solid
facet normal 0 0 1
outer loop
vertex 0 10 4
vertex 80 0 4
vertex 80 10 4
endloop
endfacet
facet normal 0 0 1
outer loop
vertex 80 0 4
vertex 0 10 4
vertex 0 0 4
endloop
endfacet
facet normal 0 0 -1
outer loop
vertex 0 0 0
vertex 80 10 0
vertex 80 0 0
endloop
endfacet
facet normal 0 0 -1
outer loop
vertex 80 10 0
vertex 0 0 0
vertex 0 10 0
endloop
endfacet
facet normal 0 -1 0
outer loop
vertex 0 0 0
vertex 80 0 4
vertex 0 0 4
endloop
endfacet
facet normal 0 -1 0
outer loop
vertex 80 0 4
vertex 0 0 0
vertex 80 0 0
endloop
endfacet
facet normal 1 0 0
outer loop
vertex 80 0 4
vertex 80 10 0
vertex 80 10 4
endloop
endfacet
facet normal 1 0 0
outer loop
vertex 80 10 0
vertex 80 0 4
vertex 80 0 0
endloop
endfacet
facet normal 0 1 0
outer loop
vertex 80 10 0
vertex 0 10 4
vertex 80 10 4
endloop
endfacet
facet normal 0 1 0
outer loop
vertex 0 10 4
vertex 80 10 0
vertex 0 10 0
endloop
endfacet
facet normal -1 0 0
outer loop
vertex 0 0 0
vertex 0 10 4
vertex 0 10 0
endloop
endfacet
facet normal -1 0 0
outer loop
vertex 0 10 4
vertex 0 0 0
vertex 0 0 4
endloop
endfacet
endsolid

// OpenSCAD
$fa=1;
$fs=1;



module build_it() {
   cube([80,10,4]);
}

module build_it2() {
	difference() {
		union() {
	      translate([5,0,0]) {
				cube([100, 10, 4]);
			   translate([50,5,-1]) {
				   cylinder(r=30, h=6);
				}
	      }
	      translate([0,4,0]) {
	          cube([10,2,4]);
	      }
	      translate([100,4,0]) {
	          cube([10,2,4]);
	      }
		}
	   translate([55,5,-2]) {
	      cylinder(r=20, h=8);
	   }
	}
}

$2d = 0;
if ($2d) {
    projection(cut=true) {
       translate([0,0,0]) rotate([0,0,0]) {
           build_it();
       }
    }
} else {
   translate([0,0,0]) rotate([0,0,0]) {
      build_it();
   }
}
